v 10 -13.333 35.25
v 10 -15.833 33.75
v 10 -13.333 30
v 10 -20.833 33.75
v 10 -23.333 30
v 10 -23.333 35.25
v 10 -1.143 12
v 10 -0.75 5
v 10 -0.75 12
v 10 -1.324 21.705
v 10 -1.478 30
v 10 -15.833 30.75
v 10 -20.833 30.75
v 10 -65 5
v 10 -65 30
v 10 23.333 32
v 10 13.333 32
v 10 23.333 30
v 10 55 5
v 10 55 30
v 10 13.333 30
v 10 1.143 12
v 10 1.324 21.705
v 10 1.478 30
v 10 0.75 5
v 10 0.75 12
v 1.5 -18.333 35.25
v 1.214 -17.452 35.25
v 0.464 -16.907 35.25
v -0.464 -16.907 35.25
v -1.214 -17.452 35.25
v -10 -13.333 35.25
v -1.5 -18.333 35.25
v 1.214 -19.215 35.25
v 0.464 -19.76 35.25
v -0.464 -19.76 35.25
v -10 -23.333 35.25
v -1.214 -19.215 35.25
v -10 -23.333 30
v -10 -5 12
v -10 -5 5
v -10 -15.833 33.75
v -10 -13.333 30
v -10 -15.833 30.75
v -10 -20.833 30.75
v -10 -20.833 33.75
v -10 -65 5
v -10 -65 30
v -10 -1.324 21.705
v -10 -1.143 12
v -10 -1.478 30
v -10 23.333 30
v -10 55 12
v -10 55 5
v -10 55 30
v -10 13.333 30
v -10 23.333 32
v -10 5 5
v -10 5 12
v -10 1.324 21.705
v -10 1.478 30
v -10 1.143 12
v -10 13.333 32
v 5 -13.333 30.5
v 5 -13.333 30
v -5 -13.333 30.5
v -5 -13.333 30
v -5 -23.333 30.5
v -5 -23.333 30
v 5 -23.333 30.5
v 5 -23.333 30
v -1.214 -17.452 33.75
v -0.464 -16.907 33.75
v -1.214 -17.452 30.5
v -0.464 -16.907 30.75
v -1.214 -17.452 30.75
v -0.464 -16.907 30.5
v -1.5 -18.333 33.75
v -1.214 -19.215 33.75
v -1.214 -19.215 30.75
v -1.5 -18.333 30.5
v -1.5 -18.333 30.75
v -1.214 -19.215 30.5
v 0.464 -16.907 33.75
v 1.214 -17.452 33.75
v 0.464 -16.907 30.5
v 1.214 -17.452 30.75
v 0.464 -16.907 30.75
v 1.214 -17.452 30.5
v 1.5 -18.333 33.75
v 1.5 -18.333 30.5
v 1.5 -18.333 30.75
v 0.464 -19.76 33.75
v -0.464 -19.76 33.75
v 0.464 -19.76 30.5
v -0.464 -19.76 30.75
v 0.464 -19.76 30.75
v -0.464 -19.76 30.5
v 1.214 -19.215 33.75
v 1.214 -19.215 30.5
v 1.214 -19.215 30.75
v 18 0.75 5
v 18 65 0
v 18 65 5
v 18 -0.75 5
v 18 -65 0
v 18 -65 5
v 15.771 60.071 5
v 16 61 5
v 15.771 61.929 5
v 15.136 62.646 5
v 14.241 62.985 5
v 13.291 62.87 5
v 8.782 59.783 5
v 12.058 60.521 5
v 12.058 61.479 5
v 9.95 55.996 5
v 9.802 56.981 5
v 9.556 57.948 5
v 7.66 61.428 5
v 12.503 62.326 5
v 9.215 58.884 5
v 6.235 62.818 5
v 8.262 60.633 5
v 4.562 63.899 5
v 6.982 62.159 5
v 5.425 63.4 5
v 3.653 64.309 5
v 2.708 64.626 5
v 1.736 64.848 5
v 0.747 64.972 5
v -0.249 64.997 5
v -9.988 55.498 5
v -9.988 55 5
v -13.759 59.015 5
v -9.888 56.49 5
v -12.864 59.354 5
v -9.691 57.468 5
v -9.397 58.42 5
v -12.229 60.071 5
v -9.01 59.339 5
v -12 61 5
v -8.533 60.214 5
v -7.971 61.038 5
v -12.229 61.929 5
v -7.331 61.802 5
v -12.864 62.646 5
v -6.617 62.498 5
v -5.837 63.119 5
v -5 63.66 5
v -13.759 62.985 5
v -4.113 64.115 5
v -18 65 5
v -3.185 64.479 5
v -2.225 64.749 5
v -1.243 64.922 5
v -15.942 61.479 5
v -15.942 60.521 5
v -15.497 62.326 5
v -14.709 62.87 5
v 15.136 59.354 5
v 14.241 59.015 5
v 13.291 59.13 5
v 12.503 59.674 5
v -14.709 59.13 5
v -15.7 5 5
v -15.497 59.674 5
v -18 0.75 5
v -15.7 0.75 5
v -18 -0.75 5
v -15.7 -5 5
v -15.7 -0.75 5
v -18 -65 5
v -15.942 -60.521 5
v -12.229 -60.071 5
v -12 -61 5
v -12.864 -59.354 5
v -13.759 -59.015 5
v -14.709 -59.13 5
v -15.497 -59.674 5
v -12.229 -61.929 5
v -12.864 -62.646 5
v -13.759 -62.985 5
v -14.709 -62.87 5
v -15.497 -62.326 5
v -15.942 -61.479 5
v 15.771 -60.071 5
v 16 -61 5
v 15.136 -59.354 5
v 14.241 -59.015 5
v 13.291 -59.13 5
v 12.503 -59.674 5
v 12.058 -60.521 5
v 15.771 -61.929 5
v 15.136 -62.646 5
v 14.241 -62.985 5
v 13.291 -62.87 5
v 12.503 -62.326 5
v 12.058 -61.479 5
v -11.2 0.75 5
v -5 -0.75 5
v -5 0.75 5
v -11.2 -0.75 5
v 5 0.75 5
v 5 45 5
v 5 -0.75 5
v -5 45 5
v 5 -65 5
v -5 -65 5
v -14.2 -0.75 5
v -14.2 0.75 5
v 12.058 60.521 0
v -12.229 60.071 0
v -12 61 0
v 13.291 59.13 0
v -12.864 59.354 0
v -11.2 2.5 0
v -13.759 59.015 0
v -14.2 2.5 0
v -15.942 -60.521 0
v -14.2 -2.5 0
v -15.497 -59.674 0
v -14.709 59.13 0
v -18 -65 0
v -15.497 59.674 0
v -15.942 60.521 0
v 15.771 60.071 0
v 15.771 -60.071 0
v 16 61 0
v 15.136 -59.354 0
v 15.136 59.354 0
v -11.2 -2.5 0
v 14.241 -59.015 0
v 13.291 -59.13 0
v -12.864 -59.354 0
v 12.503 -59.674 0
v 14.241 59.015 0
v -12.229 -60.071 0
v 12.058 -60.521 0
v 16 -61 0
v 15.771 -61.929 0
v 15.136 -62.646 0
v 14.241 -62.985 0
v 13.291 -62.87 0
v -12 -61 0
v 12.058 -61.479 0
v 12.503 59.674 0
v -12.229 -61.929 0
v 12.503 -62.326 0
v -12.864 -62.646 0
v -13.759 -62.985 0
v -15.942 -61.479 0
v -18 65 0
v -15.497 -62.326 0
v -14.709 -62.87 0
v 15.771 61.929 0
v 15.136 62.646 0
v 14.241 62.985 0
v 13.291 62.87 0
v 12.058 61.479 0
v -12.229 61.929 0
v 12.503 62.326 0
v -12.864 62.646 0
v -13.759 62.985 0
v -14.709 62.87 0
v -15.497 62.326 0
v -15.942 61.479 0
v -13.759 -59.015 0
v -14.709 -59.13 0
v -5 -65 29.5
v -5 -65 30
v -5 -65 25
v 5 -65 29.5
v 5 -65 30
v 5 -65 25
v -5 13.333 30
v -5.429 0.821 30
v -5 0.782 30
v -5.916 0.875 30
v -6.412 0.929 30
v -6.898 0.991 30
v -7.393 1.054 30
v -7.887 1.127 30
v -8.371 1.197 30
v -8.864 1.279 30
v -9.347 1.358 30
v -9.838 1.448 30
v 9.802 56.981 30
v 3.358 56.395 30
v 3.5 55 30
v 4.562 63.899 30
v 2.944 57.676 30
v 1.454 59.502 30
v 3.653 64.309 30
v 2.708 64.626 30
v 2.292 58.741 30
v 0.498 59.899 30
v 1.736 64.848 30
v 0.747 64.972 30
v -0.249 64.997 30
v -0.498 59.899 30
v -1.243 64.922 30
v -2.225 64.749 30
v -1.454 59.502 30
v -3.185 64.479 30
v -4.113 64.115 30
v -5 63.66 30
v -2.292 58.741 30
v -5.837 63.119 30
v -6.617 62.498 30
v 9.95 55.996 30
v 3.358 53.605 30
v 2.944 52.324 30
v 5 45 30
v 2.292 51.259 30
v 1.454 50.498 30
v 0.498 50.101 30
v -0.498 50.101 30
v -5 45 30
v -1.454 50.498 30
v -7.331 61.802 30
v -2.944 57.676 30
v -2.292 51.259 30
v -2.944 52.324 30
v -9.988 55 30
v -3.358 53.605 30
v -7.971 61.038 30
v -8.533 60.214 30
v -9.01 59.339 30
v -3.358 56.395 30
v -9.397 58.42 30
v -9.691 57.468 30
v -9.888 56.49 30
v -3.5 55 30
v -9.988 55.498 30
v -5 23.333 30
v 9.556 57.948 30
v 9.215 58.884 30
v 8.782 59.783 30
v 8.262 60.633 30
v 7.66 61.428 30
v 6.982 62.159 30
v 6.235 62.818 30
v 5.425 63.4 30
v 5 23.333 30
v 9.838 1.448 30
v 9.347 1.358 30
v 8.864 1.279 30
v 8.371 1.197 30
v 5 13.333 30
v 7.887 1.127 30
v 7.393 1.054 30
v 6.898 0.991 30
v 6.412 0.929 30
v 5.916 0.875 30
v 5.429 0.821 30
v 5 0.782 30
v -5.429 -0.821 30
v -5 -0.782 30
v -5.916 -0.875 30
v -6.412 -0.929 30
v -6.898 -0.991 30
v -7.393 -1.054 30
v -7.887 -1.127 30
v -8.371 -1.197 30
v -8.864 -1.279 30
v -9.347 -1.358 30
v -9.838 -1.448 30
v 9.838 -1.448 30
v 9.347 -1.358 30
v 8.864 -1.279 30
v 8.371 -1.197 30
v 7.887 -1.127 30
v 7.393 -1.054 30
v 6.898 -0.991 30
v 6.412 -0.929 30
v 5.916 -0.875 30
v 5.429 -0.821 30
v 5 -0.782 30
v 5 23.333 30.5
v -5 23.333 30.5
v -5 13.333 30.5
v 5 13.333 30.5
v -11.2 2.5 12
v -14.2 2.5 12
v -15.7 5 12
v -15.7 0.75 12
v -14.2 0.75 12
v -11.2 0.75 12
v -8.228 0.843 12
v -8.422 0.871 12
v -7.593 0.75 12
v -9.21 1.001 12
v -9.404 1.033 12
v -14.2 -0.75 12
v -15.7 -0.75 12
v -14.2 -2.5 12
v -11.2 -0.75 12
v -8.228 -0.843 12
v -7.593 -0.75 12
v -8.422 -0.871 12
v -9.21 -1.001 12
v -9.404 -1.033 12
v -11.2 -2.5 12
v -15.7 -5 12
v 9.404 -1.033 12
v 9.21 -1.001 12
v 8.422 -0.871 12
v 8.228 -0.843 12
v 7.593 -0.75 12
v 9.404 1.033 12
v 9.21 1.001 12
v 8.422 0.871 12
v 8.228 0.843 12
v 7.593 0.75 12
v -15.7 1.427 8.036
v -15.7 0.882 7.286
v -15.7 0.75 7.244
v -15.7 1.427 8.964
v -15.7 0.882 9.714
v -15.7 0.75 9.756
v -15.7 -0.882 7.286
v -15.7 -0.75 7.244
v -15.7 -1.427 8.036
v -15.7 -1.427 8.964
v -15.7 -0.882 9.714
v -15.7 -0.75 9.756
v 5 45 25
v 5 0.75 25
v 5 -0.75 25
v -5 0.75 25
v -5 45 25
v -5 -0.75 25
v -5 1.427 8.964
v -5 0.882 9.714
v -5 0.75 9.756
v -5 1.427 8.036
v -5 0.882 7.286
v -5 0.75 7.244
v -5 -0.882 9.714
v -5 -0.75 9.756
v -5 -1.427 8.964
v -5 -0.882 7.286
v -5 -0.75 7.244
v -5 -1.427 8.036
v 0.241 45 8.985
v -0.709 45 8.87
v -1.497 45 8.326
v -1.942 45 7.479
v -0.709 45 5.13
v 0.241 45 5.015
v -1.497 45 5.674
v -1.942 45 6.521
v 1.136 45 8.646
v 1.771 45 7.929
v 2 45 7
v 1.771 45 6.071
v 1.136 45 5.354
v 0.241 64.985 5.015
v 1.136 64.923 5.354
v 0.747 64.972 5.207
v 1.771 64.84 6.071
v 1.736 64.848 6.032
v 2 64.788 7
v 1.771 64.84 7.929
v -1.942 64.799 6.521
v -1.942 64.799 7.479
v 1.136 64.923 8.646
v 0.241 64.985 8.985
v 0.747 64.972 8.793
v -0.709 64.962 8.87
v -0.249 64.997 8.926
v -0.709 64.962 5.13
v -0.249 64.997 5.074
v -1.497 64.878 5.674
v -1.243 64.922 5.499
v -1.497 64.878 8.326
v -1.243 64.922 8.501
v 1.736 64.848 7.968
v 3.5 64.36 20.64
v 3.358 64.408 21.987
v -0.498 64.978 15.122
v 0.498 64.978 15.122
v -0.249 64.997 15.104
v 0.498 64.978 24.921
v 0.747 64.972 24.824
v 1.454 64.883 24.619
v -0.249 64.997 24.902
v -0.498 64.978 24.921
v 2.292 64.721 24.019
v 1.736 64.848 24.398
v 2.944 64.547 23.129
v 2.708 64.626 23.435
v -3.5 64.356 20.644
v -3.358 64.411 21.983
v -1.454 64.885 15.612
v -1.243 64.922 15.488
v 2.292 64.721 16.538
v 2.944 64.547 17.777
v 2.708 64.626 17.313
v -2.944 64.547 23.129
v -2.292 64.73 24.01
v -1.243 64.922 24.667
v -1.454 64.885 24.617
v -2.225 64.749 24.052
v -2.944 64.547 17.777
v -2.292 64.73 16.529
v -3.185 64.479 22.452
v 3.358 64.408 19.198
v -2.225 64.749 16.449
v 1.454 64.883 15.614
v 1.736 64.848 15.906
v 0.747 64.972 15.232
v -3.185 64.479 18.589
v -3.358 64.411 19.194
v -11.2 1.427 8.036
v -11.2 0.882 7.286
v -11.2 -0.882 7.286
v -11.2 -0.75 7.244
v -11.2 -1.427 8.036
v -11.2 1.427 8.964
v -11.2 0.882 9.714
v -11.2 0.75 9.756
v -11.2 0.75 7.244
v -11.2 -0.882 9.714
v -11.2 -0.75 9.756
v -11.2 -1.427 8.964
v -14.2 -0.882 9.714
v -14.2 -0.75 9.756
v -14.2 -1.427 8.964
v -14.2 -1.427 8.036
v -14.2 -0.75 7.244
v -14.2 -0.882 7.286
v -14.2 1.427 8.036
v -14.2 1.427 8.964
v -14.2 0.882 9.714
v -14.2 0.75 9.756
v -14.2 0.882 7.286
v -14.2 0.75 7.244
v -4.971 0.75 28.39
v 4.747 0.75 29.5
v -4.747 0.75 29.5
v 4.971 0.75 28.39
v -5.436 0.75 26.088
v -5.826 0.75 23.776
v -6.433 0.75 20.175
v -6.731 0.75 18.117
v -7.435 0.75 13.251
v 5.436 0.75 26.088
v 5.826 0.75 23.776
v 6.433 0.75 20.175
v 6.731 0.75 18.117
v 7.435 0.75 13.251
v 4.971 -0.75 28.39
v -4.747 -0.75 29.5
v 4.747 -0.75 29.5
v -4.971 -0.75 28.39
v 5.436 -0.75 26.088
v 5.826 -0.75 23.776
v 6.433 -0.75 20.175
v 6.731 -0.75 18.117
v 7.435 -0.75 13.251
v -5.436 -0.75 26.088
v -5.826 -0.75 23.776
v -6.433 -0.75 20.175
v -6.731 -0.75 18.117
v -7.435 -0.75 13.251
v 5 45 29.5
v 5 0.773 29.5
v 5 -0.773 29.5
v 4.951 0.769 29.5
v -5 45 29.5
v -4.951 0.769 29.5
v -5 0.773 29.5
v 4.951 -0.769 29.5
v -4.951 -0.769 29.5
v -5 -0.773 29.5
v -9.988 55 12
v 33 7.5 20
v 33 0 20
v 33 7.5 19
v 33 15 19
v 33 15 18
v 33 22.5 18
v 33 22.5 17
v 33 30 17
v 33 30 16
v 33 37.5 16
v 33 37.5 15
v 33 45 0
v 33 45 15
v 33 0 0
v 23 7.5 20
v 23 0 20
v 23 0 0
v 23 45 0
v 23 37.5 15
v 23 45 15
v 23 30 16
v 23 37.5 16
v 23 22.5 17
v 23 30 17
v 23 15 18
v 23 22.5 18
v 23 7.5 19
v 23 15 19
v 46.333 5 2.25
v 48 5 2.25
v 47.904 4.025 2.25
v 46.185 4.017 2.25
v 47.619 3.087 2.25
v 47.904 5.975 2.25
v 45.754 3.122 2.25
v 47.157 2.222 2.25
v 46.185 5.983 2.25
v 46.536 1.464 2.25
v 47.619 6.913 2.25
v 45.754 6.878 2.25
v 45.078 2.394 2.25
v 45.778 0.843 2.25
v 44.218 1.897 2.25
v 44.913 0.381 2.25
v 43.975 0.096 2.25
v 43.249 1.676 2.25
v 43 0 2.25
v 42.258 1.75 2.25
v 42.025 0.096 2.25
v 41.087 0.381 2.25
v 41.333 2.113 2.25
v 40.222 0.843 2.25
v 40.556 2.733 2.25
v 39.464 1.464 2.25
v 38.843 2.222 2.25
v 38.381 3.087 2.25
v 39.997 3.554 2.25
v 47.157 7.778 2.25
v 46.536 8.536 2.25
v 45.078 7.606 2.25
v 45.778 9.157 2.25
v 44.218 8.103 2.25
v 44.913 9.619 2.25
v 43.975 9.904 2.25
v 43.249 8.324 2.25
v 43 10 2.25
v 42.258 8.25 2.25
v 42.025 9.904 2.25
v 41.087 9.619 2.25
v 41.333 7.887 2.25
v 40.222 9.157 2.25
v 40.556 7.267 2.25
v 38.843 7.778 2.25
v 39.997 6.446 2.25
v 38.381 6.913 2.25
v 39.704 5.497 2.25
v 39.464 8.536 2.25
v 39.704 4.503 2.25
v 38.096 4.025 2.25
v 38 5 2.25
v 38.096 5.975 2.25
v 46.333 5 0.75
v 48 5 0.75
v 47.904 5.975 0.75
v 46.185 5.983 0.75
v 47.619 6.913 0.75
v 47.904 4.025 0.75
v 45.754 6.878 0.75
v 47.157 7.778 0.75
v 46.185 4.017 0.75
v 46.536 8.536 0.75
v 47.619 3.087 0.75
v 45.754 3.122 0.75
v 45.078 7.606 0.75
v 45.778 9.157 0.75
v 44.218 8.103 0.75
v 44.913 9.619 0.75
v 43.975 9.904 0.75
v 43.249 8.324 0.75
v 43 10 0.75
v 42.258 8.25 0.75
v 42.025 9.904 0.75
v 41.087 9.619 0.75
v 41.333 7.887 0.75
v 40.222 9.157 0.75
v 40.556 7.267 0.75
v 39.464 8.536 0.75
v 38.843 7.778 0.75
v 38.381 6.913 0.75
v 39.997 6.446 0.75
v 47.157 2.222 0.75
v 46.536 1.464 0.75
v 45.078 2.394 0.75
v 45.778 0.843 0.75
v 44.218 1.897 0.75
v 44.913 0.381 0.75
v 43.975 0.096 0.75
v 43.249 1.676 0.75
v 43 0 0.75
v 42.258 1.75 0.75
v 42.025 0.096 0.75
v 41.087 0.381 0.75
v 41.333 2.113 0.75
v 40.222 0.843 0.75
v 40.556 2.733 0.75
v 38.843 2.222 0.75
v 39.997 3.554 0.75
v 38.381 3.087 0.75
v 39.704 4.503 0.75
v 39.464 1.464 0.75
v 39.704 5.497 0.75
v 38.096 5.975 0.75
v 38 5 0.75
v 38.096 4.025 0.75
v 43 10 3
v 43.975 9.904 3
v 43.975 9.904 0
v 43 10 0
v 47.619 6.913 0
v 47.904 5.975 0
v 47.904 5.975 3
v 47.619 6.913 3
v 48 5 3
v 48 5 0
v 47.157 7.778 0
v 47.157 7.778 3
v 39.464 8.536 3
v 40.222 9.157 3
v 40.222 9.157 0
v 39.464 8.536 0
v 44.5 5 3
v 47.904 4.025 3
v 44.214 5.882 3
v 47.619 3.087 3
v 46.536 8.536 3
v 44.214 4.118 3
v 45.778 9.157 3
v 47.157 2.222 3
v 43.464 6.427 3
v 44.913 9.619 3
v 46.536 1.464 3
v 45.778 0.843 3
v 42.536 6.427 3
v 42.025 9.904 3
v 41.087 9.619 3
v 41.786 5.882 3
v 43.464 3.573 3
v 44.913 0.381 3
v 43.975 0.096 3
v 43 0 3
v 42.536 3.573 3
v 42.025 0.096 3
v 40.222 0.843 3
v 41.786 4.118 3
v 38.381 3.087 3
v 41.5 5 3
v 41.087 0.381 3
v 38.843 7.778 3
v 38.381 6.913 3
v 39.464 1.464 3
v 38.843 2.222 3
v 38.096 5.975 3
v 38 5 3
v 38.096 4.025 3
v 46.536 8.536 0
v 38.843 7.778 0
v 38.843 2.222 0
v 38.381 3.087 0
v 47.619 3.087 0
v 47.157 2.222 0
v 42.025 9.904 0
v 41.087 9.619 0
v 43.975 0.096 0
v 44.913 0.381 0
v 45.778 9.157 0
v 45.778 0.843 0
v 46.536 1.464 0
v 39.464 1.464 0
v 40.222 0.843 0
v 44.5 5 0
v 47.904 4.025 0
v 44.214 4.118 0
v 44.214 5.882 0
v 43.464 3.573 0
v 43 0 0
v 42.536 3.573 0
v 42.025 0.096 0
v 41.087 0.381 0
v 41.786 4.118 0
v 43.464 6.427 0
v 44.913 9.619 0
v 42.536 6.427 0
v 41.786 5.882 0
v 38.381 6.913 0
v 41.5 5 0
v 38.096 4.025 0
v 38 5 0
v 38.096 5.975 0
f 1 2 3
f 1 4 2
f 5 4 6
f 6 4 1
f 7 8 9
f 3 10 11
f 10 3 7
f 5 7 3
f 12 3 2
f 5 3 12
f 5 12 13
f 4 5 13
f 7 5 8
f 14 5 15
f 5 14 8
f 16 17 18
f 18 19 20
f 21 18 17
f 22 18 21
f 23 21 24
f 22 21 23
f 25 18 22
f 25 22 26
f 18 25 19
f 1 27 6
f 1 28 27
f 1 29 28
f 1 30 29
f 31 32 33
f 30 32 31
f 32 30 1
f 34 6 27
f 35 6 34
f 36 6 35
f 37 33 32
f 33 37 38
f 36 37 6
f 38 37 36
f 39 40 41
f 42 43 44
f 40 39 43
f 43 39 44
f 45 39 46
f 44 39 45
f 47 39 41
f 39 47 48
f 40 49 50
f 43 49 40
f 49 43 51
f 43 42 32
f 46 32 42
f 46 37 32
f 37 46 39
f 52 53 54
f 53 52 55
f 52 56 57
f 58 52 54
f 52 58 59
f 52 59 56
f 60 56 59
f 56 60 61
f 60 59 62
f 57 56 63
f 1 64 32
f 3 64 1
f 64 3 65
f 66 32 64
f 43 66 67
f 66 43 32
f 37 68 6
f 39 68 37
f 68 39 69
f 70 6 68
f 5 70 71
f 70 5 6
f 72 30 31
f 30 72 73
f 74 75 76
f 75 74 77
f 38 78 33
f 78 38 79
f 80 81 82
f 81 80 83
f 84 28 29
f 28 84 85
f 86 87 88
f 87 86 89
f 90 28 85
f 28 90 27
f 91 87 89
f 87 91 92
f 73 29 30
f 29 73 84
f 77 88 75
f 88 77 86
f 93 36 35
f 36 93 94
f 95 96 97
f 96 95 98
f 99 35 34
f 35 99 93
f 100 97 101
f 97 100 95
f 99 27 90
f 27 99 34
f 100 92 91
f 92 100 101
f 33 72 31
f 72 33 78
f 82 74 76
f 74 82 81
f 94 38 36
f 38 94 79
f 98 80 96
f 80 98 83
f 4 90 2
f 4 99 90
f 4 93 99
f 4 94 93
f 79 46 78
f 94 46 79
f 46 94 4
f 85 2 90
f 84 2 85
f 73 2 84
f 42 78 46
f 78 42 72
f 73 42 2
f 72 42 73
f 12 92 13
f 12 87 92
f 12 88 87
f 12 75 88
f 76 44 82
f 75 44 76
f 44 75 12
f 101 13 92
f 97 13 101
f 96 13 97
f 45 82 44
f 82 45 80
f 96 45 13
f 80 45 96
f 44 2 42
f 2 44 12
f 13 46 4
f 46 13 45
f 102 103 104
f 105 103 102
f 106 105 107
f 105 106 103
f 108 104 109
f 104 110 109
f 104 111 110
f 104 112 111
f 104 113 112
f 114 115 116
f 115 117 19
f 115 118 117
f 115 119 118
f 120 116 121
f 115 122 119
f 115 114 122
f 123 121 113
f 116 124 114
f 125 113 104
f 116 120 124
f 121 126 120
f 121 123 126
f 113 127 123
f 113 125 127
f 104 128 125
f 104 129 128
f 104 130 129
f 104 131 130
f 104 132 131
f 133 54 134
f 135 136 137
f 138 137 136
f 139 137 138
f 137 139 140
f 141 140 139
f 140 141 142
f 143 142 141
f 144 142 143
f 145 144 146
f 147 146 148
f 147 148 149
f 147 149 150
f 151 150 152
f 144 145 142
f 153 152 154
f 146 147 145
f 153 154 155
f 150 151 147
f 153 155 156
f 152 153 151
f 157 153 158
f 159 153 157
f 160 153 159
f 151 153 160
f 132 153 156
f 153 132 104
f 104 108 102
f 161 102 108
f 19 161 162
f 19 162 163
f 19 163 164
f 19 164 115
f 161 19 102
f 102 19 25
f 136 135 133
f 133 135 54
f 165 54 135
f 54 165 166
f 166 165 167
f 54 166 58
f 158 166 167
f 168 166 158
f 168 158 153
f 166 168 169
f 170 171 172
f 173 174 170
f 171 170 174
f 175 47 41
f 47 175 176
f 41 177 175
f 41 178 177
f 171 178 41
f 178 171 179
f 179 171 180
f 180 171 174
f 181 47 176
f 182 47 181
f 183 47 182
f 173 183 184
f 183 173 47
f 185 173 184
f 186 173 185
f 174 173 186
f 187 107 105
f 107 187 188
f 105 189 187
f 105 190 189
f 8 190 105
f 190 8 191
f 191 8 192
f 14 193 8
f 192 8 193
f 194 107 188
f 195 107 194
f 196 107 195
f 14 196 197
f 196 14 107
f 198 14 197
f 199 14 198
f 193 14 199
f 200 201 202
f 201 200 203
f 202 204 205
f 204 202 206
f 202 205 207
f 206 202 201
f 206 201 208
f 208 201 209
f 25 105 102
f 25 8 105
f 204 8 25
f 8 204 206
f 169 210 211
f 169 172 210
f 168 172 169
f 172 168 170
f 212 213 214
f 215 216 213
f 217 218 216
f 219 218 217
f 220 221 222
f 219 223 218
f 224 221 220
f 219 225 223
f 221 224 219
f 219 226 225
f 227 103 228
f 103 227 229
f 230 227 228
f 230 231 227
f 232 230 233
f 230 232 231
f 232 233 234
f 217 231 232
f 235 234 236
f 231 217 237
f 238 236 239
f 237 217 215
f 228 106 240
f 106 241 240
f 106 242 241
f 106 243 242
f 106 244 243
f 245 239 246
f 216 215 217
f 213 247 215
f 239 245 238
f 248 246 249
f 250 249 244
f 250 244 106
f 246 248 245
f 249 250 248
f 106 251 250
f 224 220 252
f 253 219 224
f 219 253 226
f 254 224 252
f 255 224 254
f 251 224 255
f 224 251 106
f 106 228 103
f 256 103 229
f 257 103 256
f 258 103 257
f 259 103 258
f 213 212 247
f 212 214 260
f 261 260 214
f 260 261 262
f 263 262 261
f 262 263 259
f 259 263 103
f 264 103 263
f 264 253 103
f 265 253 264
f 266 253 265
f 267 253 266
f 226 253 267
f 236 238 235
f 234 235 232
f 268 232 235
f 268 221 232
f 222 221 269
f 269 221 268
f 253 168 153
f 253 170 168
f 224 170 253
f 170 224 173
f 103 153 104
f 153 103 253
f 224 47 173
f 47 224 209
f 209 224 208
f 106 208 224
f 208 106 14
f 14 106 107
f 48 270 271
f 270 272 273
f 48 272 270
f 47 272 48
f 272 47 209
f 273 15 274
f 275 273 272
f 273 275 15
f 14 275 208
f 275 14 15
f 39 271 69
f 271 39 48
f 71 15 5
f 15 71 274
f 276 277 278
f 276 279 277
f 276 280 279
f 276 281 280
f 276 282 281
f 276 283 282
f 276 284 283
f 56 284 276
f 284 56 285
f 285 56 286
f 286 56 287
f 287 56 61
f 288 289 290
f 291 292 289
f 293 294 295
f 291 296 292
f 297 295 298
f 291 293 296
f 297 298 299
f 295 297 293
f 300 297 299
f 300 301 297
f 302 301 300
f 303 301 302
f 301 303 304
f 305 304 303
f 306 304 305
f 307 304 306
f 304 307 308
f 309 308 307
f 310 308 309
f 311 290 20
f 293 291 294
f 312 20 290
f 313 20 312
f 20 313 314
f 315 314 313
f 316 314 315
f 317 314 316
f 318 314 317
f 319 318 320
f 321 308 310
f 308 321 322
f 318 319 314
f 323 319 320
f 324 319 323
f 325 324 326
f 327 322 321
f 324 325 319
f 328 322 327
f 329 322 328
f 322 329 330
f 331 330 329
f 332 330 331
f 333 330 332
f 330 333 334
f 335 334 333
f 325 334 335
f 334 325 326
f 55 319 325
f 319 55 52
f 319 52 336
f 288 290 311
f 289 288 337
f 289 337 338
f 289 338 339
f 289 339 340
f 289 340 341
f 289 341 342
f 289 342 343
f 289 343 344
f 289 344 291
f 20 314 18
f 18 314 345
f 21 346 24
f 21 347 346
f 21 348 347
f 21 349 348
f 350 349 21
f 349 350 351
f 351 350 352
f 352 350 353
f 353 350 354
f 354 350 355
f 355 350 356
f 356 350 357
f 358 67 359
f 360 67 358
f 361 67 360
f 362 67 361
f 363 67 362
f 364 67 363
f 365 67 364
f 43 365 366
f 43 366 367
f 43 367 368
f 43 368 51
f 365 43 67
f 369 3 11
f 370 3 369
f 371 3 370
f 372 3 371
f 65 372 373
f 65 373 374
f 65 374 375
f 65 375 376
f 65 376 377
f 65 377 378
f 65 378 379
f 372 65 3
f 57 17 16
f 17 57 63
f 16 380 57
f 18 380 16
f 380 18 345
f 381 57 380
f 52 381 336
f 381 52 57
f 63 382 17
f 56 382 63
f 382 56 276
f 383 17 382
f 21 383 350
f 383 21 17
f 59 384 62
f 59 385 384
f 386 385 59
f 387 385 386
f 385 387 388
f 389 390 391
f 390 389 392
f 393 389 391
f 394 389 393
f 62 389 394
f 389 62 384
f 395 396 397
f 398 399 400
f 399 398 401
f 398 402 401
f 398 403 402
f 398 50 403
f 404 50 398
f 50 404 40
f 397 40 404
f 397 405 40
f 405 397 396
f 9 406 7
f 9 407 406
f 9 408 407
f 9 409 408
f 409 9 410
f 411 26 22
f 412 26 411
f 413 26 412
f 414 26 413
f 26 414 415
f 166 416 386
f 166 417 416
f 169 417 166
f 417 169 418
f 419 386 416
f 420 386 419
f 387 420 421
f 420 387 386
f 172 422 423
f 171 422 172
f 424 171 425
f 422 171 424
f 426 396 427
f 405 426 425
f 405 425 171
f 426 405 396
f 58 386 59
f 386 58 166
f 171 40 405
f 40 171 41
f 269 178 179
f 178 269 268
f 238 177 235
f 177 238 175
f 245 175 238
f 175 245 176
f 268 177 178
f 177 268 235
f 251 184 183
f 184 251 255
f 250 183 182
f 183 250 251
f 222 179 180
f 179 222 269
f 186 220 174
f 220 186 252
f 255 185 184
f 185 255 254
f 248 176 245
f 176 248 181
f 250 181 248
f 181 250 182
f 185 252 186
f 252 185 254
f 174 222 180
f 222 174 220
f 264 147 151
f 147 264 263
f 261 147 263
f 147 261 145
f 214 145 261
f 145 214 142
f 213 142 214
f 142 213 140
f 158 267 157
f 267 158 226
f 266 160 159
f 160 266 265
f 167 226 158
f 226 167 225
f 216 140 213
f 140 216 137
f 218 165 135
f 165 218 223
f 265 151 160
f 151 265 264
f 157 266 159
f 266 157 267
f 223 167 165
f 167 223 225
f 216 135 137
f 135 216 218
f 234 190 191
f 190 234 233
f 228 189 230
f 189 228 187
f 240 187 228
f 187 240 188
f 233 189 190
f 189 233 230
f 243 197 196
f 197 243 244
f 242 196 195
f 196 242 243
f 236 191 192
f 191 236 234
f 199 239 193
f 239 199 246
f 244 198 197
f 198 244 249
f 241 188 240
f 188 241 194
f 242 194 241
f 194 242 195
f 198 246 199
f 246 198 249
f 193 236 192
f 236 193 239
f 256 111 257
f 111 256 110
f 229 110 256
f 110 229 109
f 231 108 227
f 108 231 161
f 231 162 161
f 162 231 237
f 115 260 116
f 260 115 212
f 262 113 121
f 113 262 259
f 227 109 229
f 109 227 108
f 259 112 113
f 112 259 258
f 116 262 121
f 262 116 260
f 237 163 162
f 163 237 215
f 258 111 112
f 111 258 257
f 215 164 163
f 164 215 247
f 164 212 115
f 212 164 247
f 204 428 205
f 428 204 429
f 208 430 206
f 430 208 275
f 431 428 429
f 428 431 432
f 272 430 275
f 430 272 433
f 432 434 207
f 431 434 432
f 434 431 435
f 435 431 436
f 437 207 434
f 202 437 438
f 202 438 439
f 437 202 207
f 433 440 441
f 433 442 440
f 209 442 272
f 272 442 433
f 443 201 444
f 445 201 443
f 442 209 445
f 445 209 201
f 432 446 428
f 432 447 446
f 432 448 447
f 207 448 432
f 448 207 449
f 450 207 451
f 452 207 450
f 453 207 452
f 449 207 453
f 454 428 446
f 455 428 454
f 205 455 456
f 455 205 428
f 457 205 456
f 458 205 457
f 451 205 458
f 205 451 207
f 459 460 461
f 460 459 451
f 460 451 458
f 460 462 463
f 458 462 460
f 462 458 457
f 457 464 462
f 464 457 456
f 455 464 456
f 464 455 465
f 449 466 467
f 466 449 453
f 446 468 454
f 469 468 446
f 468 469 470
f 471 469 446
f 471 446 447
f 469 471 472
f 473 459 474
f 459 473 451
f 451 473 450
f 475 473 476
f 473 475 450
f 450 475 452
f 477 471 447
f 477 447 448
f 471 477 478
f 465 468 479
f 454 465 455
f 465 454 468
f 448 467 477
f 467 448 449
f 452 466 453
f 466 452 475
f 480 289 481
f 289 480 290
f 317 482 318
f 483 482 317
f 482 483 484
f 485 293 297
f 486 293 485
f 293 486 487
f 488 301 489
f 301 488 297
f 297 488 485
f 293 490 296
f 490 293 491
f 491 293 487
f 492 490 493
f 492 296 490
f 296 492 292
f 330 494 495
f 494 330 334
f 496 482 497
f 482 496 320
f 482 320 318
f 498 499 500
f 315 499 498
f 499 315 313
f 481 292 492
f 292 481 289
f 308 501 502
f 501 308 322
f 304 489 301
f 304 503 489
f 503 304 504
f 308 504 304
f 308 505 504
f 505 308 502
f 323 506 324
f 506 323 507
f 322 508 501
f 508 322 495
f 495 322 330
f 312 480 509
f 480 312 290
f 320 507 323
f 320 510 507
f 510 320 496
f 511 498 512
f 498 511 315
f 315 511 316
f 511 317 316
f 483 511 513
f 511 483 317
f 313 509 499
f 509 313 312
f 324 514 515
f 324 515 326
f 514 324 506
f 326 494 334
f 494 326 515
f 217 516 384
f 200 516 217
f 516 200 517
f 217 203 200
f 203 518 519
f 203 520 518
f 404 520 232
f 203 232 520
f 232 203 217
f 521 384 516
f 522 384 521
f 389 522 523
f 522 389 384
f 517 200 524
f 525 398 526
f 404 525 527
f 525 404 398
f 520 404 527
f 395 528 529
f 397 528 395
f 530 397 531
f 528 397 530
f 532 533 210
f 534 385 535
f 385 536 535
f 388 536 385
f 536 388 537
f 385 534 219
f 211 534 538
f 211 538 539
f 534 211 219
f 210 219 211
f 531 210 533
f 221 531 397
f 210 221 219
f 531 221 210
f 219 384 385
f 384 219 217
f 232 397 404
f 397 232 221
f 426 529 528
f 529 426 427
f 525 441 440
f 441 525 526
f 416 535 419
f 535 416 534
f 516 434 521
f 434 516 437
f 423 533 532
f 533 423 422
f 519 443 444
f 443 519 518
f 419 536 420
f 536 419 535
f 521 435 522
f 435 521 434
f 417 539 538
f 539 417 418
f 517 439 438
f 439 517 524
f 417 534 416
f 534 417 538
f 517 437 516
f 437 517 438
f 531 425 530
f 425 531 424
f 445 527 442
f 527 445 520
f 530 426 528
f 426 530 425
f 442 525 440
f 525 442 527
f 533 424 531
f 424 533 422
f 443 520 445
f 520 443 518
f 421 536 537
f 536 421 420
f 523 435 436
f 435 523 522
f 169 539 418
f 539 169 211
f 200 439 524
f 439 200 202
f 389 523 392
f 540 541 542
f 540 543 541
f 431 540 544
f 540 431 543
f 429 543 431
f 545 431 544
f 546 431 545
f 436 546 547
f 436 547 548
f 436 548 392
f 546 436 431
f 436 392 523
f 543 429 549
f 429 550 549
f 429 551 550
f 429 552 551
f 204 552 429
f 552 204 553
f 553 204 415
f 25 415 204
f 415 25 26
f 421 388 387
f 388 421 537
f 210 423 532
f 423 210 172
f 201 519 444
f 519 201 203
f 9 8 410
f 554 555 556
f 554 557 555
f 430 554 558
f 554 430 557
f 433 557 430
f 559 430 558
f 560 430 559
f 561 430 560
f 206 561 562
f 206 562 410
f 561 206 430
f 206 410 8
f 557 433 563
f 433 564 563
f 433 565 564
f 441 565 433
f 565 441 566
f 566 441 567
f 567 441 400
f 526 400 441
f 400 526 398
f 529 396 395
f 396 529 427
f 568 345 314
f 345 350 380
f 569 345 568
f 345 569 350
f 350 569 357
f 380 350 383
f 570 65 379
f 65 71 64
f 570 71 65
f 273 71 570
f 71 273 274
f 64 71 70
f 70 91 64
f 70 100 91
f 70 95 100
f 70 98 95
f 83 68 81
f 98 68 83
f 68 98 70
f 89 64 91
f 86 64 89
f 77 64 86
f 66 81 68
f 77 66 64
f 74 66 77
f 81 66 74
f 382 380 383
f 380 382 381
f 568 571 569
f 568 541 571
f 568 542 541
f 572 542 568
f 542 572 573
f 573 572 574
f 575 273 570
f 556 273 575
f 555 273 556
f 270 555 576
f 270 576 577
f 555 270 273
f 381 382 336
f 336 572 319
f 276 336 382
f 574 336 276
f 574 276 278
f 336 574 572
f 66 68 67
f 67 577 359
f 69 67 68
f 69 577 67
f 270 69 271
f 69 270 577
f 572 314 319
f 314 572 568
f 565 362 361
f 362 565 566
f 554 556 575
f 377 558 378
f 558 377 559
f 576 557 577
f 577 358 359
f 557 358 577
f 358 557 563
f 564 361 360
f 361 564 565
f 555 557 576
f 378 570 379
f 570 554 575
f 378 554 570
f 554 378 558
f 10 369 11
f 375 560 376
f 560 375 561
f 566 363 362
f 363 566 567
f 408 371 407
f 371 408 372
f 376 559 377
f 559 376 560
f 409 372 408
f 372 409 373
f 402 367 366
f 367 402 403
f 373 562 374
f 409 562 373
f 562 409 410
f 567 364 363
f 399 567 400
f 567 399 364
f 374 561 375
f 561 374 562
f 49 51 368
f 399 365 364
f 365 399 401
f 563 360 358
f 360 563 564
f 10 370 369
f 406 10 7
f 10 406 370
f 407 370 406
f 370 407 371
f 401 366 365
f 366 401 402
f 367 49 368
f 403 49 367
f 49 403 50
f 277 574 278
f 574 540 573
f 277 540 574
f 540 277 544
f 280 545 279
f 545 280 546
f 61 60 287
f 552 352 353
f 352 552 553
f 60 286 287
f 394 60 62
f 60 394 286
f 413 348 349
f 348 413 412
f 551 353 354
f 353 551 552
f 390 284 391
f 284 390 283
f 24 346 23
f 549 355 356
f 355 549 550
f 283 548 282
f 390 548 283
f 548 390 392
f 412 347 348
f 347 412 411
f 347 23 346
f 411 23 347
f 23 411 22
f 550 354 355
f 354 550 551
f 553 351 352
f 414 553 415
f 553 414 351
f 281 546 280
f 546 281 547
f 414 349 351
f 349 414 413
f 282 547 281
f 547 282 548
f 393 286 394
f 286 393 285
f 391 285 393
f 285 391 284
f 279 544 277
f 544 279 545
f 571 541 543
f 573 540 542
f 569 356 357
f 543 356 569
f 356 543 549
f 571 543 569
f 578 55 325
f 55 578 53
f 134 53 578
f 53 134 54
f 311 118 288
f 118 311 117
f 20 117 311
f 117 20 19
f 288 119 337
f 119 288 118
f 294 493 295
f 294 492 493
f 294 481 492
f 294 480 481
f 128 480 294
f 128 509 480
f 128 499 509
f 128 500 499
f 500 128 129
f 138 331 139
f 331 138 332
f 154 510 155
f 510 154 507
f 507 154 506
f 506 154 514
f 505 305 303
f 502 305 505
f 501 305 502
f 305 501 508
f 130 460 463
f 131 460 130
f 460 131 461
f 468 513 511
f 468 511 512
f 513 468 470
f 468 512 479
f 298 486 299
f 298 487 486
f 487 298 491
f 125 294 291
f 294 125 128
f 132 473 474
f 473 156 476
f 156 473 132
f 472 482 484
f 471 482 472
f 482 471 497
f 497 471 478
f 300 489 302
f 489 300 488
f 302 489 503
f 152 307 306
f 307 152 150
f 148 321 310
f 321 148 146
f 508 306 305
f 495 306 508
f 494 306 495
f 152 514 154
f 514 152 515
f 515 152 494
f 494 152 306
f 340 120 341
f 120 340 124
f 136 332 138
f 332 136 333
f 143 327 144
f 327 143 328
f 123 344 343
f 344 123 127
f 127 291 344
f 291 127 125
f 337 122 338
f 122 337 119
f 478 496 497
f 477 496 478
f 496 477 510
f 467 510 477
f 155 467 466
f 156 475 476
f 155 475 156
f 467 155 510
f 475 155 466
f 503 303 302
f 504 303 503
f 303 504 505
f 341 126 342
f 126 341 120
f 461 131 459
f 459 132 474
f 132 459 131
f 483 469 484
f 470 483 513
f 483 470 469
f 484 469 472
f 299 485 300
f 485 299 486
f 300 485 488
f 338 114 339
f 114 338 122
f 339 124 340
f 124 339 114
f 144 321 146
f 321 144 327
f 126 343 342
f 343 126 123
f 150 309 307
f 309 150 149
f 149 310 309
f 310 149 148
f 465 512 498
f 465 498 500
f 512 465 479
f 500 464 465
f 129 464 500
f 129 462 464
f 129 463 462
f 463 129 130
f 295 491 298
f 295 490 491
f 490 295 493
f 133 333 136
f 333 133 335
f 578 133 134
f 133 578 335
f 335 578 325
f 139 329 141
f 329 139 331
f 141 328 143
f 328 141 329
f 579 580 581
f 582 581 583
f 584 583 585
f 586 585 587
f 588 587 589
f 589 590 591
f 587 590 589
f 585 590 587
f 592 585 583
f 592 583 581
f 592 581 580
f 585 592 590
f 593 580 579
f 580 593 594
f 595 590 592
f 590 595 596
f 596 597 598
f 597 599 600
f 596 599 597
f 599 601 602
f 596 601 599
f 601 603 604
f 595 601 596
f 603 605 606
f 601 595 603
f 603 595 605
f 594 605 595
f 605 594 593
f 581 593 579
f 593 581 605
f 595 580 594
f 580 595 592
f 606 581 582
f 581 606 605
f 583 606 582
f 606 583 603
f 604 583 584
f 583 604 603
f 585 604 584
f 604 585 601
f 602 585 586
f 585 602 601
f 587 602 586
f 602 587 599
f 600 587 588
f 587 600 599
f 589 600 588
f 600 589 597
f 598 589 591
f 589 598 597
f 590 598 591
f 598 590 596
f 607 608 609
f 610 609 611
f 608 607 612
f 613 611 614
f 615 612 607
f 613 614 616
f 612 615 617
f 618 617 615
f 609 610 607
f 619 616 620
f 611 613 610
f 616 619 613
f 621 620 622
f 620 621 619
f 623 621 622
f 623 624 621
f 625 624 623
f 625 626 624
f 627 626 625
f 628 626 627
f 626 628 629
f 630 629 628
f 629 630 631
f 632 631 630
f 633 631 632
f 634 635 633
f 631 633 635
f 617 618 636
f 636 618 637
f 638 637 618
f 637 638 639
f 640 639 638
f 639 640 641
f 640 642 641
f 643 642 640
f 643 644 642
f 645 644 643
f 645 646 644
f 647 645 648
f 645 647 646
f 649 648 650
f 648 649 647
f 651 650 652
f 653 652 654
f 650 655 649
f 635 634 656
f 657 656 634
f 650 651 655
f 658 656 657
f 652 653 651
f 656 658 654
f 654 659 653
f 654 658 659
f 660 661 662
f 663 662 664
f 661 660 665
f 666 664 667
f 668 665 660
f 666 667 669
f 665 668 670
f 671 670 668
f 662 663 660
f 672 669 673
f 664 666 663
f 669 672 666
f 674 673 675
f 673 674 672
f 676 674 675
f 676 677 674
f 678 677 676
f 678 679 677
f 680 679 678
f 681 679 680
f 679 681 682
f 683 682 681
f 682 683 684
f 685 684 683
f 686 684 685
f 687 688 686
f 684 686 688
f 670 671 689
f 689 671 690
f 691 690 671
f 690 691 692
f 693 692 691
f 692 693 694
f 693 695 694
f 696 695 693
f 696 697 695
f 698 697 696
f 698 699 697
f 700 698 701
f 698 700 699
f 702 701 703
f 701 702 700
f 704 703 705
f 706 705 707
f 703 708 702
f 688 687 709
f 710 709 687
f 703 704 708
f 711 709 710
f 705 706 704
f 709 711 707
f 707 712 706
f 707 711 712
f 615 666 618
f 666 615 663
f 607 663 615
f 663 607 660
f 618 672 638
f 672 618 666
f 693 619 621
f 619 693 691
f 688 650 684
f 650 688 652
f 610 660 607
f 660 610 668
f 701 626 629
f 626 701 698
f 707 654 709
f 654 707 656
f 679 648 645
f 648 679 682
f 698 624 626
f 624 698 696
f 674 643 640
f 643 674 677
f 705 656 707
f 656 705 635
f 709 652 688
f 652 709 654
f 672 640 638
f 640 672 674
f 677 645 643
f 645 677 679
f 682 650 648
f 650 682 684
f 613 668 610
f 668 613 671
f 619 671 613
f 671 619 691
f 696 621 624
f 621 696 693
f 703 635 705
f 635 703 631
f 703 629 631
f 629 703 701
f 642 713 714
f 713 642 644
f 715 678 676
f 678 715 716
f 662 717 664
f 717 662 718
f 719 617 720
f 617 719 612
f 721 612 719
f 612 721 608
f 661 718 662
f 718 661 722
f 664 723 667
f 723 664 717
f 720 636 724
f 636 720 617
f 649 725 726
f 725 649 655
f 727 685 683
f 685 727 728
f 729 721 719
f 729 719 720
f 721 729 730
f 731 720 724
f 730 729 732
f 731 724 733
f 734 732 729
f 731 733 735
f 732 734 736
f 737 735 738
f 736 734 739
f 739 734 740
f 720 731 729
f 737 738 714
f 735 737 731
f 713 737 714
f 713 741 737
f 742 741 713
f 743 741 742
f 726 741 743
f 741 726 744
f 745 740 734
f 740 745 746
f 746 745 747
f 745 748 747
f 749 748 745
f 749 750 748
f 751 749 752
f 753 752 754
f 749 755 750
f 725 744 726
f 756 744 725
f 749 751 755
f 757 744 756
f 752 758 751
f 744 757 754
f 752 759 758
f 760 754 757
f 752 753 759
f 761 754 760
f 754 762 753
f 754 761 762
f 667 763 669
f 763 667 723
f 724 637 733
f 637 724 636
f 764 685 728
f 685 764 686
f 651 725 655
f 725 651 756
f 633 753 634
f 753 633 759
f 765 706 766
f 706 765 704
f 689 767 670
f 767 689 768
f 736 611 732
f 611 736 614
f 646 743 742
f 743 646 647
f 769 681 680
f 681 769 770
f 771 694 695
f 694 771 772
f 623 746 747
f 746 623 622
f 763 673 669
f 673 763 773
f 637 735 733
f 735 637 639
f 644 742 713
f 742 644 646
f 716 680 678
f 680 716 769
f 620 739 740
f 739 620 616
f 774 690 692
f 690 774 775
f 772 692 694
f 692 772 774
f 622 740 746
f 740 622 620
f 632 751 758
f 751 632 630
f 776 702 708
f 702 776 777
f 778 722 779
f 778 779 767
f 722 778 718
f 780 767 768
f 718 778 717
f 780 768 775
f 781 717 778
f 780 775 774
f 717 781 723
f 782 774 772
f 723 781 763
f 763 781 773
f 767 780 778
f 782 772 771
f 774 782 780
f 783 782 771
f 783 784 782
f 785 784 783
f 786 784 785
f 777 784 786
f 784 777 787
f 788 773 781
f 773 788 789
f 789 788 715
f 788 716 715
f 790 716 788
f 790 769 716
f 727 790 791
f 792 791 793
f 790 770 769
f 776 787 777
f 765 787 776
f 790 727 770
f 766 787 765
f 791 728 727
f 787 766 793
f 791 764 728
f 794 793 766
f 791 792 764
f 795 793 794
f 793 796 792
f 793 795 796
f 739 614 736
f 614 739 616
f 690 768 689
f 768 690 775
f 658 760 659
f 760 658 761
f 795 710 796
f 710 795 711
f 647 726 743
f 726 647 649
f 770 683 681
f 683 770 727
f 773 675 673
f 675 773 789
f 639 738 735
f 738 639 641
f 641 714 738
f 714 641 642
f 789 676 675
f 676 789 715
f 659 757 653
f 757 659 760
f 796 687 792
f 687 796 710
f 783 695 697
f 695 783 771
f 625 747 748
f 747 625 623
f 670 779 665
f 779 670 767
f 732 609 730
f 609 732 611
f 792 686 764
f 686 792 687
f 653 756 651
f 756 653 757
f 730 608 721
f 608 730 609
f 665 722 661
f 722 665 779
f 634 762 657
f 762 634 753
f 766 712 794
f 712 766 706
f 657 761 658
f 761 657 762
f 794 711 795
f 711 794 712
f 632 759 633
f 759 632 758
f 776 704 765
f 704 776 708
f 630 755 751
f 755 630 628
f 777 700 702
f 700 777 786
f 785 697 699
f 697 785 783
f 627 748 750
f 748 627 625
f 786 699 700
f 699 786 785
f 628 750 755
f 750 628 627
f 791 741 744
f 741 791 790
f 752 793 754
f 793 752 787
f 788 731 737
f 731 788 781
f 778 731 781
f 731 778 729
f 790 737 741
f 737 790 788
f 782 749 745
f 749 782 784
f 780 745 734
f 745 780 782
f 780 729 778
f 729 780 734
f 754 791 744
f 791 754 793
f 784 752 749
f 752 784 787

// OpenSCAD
$fa=1;
$fs=1;

/*
========================USER DEFINED VARIABLES========================
*/
//strip minimal width
smw=5;
//bottle base diameter (double of the distance between hole and cutting space)
bd=110;
//blade thickness
bt=1;
//blade width
bw=10;
//cutting side
cs=-1;//[-1,1]
//rope passing hole size (proportion of blade width)
hr=0.7;//[0.01:0.01:1]
//wood screws diameter
wsd=4;
//screw diameter
sd=3;
//nut thickness
nt=3;
//nut width
nw=5;
//body plate height
bph=5;
//nuber of steps
nbs=6;
//step size
ss=1;
//spacer base height
sbh=20;
//body center walls thickness
bcwt=5;
//spacer holder height
shh=7;
//spacer disgaging probe ("stick") diameter
spd=4;
//cutting space angle ratio
csar=0.98;//[0.01:0.01:1]
/*
========================VARIABLES DECLARATION========================
*/
bbr=bd/2;//bottle base radius

bcw=bw+(bcwt*2);//body center width
ssl=(bbr-bcw/2)/nbs;//spacer step length

bl=bbr*2+bcw;//body length
bch=bph+sbh+smw;//body center height


sw=bw;//spacer width

pbw=wsd*2;//plate border width
bpw=bcw+(pbw*2);//body plate width

bho=bbr/3;//blade holders offset
bhh=nt*3.5;//blade holders height
bhl=nw*2;//blade holders length
nho=nt*0.75;//nut holder offset

csh=(bch-bph)*2;//cuting space height

bbh=shh+bph;//base bottom height

/*
========================MODULES DECLARATION========================
*/
module spacer(){
    union(){
        for(i=[0:nbs-1]){
            translate([0,(i+1)*ssl/2,(sbh-i*ss)/2]) cube([sw,(i+1)*ssl,sbh-i*ss],center=true);
        }
    }
}


module body(){
    difference(){
        union(){
            //body plate
            translate([0,0,bph/2]) cube([bpw,bl,bph],center=true);
            //body center
            translate([0,0,bch/2]) cube([bcw,bl,bch],center=true);
            //blade holding screw mount
            translate([0,-bho,bch]) difference(){
                cube([bcw,bhl,bhh],center=true);
                cylinder(d=sd,h=bch,center=true);
                translate([0,0,nho]) cube([bcw*2,nw,nt],center=true);
                }
            //secondary blade holder
            translate([0,bho,bch]) cube([bcw,bhl,bt*4],center=true);
            
            //spacer holding screw mount  
            translate([((bcw/2)+(nt*0.9))*cs,0,bph+shh/2]) cube([nt*2,nw*2,shh],center=true);
            
        }
        
        //body center hollow element
        translate([0,-bcw,bph+(sbh/2)]) cube([sw,bl,sbh],center=true);
        
        //spacer disgaging "poke with a stick" acess latch ("hole")
        translate([0,0,bph+spd/2]) rotate([-90,0,0]) cylinder(d=spd,h=bl);
        
        //plate holding wood screws
        for(i=[-1,1]){
            for(j=[-1,1]){
                translate([(bpw/2-wsd)*i,(bl/2-wsd)*j,0]) cylinder (d=wsd,h=20,center=true);
            }
        }
        //rope passing hole
        translate([0,bl/2-bcw/2,bch]) rotate([45,0,0]) cylinder(d=bw*hr,h=bch*1.5,center=true);
        //spacer holding screw nut mount
        translate([((bcw/2)+(nt*0.9))*cs,0,0]) cube([3,5,100],center=true);
        //spacer holding screw hole
        translate([((bcw/2)+(nt*0.9))*cs,0,bph+shh/2]) rotate([0,90,0]) cylinder(d=sd,h=30,center=true);
        //cutting space
        translate([0,0,bch]) cube([bpw,1.5,csh],center=true);
        //blade groove element
        translate([0,-bcw,bch]) cube([bw,bl,bt],center=true);
    }
}





module base(){
    difference(){
        //cuting space angle elements
        for(i=[-1,1]){
            translate([0,bbr*i,bch]) cylinder(h=bch*2,r1=bbr,r2=bbr*csar,center=true);
        }
        //extremity cube (allow for more precise forming on rope end)
        translate([-bbr,bl/2-bcw/2,-bch/2]) cube([bbr*2,bbr*2,bch*3]);
    }
    //rope end modeling cylinder
    translate([0,bl/2-bcw/2,bch]) cylinder(h=bch*2,d=bcw,center=true);
    //spacer holder rectifier (prevent it from being deformed when carving cuting space angle)
    translate([0,-bcw/2,bbh/2]) cube([bpw,bl,bbh],center=true);
    //body plate element (to prevent it from being removed by keeping it in selection)
    translate([0,0,bph/2]) cube([bpw,bl,bph],center=true);
    
}


module attachment(){
    difference(){
        cylinder(d=bhl,h=nt,center=true);
        cylinder(d=sd,h=nt*2,center=true);
        difference(){
                cylinder(d=bhl*1.5,h=nt/2,center=true);
                cylinder(d=bhl/1.5,h=nt,center=true);
            }
    }
}


intersection(){
    body();
    base();
}

translate([bpw/2+sw,0,0]) spacer();
translate([bpw/2+sw+bhl*1.5,bhl/2,nt/2]) attachment();

echo(bl);
